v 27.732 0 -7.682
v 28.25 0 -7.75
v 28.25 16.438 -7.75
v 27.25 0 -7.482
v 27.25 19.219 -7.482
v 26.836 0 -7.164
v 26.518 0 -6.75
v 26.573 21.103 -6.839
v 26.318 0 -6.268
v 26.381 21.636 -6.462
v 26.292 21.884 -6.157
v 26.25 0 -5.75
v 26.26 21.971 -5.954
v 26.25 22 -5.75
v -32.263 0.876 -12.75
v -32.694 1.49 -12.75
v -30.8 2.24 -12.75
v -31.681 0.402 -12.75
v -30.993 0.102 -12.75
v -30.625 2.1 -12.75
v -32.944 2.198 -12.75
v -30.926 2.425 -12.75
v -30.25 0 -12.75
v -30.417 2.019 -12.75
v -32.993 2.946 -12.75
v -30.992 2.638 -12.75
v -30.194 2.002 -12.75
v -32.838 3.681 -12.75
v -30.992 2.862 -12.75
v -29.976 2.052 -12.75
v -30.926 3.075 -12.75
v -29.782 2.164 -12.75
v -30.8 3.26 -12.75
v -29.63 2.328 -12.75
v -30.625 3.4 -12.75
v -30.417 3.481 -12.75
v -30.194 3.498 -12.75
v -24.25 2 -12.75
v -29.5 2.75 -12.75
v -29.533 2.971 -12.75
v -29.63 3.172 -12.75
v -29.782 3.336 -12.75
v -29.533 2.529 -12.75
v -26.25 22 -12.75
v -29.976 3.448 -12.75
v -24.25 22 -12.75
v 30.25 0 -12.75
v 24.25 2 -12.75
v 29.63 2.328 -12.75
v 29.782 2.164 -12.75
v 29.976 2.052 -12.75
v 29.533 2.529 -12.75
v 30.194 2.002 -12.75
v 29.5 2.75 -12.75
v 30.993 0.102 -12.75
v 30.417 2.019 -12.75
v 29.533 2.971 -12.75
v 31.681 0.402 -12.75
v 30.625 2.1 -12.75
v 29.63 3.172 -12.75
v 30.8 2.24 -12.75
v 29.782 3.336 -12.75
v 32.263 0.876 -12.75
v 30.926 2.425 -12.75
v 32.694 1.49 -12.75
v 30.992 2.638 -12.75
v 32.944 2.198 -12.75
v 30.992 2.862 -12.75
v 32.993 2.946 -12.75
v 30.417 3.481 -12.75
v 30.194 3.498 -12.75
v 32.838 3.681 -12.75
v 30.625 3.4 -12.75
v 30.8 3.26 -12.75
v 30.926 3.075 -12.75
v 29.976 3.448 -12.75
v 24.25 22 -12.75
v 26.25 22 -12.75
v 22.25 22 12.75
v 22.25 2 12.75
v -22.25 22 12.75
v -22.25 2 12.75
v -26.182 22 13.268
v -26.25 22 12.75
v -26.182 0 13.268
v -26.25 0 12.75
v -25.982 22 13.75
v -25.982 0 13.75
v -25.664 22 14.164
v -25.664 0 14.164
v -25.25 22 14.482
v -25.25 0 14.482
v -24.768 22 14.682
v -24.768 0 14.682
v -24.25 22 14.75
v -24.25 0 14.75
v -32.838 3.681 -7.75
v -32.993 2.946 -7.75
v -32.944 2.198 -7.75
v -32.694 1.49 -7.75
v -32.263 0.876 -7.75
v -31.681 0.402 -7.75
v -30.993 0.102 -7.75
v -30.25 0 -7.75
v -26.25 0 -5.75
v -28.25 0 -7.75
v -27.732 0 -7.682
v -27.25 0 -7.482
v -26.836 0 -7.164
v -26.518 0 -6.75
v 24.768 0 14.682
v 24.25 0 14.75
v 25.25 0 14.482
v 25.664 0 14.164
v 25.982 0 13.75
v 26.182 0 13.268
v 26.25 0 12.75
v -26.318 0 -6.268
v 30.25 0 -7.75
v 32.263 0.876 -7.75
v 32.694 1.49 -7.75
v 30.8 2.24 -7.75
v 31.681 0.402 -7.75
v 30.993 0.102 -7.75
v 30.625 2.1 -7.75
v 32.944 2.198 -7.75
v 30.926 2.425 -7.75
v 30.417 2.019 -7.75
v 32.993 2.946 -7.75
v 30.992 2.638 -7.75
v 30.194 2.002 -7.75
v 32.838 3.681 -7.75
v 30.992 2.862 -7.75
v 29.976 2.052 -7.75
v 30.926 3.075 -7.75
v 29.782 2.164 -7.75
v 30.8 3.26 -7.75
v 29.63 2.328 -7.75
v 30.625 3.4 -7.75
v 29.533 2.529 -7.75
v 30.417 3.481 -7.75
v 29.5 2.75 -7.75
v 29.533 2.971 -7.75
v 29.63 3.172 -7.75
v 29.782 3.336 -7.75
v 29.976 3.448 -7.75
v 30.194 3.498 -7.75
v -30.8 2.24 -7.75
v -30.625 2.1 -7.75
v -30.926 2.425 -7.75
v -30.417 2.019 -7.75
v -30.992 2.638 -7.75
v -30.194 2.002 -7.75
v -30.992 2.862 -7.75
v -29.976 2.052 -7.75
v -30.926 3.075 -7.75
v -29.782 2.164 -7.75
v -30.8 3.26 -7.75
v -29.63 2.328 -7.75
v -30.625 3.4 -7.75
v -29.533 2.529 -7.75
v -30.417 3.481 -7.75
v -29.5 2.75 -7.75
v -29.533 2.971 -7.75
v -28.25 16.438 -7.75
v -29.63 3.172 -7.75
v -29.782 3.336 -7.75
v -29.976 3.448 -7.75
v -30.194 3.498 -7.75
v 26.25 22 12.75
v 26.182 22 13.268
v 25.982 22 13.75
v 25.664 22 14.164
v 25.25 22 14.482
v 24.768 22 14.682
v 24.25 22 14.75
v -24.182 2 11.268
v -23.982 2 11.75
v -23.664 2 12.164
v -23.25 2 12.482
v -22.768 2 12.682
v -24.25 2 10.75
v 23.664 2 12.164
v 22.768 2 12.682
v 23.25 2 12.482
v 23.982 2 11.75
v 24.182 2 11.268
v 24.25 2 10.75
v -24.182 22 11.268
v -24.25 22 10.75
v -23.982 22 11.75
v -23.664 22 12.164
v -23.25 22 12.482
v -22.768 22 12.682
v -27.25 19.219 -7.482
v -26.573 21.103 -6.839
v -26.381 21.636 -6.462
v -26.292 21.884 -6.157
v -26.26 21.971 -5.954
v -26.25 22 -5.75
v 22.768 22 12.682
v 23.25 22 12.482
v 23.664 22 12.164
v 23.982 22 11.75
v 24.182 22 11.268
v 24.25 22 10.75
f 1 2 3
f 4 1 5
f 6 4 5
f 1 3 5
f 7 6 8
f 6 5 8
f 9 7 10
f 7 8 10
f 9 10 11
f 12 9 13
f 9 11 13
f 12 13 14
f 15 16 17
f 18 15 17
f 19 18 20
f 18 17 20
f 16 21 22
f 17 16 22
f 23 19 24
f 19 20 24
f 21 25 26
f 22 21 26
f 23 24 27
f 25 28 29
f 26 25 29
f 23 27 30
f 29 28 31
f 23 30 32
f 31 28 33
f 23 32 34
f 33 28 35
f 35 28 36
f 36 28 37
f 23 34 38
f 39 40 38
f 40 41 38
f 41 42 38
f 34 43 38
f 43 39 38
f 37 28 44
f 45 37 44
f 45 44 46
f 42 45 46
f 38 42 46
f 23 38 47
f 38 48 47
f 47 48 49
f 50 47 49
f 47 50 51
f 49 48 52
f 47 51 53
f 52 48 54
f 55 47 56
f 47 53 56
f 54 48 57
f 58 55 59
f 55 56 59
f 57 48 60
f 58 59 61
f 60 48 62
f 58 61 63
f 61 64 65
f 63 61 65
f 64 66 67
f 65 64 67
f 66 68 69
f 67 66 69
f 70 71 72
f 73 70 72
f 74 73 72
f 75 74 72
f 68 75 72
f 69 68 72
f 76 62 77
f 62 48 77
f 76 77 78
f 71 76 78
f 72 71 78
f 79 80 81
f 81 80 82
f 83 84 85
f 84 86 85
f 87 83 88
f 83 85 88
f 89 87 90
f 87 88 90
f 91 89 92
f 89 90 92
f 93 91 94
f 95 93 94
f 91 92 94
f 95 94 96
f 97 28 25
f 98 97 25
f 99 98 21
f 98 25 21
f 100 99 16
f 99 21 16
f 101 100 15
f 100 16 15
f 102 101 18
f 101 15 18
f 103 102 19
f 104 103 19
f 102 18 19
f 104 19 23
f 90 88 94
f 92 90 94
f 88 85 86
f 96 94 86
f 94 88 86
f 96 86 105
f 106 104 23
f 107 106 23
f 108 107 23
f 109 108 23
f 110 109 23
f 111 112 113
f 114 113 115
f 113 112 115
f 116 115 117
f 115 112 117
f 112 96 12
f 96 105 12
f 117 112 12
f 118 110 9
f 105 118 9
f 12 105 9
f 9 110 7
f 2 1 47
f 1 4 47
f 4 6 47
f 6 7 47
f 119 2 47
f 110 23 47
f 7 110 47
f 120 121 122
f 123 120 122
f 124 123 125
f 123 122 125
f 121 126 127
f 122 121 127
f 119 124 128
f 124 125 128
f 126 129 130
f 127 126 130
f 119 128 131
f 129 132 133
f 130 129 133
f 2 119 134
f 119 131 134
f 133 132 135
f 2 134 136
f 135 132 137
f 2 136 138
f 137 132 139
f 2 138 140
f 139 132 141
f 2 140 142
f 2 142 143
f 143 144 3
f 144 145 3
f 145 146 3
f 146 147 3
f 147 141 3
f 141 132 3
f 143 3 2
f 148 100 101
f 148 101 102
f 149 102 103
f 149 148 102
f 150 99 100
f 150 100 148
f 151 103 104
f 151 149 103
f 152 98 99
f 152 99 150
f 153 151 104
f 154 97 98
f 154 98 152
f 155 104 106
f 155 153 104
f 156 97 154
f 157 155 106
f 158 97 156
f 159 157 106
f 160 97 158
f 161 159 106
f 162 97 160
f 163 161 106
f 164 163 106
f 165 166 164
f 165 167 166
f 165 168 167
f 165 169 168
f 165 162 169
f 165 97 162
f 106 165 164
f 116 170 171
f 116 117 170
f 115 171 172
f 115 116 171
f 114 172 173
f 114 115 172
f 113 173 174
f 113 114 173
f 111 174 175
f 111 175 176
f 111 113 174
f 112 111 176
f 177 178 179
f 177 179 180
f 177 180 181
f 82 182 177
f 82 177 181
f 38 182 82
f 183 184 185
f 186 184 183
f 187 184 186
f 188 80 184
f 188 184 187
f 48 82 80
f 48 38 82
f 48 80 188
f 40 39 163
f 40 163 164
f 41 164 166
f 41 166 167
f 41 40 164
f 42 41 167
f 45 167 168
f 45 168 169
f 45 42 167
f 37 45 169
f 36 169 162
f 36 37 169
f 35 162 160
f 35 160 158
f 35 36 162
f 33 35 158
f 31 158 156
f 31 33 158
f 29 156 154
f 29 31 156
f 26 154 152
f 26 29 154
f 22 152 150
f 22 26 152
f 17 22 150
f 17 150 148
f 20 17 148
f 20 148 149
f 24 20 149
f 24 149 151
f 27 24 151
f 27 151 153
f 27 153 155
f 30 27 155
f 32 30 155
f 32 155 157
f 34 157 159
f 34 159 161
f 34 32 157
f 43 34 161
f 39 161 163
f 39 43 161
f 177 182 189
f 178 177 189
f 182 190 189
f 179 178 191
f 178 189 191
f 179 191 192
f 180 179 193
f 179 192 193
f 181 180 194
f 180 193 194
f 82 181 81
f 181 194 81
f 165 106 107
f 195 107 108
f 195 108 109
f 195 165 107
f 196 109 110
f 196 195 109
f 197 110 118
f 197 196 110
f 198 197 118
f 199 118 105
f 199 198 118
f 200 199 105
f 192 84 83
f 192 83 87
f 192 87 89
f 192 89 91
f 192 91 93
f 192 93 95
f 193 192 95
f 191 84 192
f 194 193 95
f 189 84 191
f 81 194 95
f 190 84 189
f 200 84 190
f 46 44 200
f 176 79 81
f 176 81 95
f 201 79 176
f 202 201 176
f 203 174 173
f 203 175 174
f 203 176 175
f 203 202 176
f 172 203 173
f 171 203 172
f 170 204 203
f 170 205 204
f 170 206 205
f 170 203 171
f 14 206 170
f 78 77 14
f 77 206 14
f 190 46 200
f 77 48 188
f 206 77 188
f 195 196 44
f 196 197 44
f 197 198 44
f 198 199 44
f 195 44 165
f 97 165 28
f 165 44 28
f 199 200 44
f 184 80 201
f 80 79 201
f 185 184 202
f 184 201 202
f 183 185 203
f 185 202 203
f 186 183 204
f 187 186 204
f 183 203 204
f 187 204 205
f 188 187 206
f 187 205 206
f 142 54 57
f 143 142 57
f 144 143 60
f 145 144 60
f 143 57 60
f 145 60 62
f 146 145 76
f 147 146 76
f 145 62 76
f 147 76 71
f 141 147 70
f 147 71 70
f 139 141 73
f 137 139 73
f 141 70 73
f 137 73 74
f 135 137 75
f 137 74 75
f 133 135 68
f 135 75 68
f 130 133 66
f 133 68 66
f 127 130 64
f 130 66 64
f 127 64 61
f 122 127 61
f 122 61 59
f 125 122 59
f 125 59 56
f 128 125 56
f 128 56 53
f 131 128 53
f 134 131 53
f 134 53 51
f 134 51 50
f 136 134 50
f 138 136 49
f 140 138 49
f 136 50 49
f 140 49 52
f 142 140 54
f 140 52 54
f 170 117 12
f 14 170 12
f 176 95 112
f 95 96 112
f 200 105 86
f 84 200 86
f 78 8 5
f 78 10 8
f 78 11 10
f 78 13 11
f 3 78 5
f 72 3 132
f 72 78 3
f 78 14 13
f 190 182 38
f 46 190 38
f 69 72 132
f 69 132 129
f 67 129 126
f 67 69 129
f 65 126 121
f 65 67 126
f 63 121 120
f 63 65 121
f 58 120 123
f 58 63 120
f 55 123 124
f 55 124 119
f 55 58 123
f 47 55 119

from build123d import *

# Parameters (mm, degrees)
SKETCH1_W           = 52.5
SKETCH1_H           = 27.5
BOSS_EXTRUDE1_DEPTH = 2
BOSS_EXTRUDE2_DEPTH = 20
FILLET1_R           = 2
SKETCH3_R           = 0.75
BOSS_EXTRUDE3_DEPTH = 5
FILLET3_R           = 2


with BuildPart() as part:
    # Sketch1 → Boss-Extrude1 (new body)
    with BuildSketch(Plane(origin=(0, 0, 0), x_dir=(1, 0, 0), z_dir=(0, 1, 0))):
        with Locations((0, -1)):
            Rectangle(SKETCH1_W, SKETCH1_H)
    extrude(amount=BOSS_EXTRUDE1_DEPTH)

    # Sketch2 → Boss-Extrude2 (add)
    with BuildSketch(Plane(origin=(0, 2, 0), x_dir=(1, 0, 0), z_dir=(0, 1, 0))):
        Polygon((26.25, -14.75), (26.25, 12.75), (24.25, 12.75), (24.25, -12.75), (-24.25, -12.75), (-24.25, 12.75), (-26.25, 12.75), (-26.25, -14.75), align=None)
    extrude(amount=BOSS_EXTRUDE2_DEPTH)

    # Fillet1
    fillet1_edges = [part.edges().sort_by_distance(p)[0] for p in [
        (24.25, 12, 12.75),
        (-24.25, 12, 12.75),
        (26.25, 11, 14.75),
        (-26.25, 11, 14.75),
    ]]
    fillet(fillet1_edges, radius=FILLET1_R)

    # Sketch3 → Boss-Extrude3 (add)
    with BuildSketch(Plane(origin=(0, 0, -12.75), x_dir=(-1, 0, 0), z_dir=(0, 0, -1))):
        with BuildLine():
            Line((-26.25, 22), (-32.837765597, 3.680574669))
            ThreePointArc((-32.837765597, 3.680574669), (-32.499620006, 1.168320567), (-30.25, 0))
            Line((-30.25, 0), (-26.25, 0))
            Line((-26.25, 0), (-26.25, 22))
        make_face()
        with Locations((-30.25, 2.75)):
            Circle(SKETCH3_R, mode=Mode.SUBTRACT)
    boss_extrude3 = extrude(amount=-BOSS_EXTRUDE3_DEPTH)

    # Mirror3: Boss-Extrude3 across plane
    add(boss_extrude3.mirror(Plane(origin=(0, 0, 0), x_dir=(0, 0, 1), z_dir=(1, 0, 0))))

    # Fillet3
    fillet3_edges = [part.edges().sort_by_distance(p)[0] for p in [
        (26.25, 11, -7.75),
        (-26.25, 11, -7.75),
    ]]
    fillet(fillet3_edges, radius=FILLET3_R)


solid = part.part
